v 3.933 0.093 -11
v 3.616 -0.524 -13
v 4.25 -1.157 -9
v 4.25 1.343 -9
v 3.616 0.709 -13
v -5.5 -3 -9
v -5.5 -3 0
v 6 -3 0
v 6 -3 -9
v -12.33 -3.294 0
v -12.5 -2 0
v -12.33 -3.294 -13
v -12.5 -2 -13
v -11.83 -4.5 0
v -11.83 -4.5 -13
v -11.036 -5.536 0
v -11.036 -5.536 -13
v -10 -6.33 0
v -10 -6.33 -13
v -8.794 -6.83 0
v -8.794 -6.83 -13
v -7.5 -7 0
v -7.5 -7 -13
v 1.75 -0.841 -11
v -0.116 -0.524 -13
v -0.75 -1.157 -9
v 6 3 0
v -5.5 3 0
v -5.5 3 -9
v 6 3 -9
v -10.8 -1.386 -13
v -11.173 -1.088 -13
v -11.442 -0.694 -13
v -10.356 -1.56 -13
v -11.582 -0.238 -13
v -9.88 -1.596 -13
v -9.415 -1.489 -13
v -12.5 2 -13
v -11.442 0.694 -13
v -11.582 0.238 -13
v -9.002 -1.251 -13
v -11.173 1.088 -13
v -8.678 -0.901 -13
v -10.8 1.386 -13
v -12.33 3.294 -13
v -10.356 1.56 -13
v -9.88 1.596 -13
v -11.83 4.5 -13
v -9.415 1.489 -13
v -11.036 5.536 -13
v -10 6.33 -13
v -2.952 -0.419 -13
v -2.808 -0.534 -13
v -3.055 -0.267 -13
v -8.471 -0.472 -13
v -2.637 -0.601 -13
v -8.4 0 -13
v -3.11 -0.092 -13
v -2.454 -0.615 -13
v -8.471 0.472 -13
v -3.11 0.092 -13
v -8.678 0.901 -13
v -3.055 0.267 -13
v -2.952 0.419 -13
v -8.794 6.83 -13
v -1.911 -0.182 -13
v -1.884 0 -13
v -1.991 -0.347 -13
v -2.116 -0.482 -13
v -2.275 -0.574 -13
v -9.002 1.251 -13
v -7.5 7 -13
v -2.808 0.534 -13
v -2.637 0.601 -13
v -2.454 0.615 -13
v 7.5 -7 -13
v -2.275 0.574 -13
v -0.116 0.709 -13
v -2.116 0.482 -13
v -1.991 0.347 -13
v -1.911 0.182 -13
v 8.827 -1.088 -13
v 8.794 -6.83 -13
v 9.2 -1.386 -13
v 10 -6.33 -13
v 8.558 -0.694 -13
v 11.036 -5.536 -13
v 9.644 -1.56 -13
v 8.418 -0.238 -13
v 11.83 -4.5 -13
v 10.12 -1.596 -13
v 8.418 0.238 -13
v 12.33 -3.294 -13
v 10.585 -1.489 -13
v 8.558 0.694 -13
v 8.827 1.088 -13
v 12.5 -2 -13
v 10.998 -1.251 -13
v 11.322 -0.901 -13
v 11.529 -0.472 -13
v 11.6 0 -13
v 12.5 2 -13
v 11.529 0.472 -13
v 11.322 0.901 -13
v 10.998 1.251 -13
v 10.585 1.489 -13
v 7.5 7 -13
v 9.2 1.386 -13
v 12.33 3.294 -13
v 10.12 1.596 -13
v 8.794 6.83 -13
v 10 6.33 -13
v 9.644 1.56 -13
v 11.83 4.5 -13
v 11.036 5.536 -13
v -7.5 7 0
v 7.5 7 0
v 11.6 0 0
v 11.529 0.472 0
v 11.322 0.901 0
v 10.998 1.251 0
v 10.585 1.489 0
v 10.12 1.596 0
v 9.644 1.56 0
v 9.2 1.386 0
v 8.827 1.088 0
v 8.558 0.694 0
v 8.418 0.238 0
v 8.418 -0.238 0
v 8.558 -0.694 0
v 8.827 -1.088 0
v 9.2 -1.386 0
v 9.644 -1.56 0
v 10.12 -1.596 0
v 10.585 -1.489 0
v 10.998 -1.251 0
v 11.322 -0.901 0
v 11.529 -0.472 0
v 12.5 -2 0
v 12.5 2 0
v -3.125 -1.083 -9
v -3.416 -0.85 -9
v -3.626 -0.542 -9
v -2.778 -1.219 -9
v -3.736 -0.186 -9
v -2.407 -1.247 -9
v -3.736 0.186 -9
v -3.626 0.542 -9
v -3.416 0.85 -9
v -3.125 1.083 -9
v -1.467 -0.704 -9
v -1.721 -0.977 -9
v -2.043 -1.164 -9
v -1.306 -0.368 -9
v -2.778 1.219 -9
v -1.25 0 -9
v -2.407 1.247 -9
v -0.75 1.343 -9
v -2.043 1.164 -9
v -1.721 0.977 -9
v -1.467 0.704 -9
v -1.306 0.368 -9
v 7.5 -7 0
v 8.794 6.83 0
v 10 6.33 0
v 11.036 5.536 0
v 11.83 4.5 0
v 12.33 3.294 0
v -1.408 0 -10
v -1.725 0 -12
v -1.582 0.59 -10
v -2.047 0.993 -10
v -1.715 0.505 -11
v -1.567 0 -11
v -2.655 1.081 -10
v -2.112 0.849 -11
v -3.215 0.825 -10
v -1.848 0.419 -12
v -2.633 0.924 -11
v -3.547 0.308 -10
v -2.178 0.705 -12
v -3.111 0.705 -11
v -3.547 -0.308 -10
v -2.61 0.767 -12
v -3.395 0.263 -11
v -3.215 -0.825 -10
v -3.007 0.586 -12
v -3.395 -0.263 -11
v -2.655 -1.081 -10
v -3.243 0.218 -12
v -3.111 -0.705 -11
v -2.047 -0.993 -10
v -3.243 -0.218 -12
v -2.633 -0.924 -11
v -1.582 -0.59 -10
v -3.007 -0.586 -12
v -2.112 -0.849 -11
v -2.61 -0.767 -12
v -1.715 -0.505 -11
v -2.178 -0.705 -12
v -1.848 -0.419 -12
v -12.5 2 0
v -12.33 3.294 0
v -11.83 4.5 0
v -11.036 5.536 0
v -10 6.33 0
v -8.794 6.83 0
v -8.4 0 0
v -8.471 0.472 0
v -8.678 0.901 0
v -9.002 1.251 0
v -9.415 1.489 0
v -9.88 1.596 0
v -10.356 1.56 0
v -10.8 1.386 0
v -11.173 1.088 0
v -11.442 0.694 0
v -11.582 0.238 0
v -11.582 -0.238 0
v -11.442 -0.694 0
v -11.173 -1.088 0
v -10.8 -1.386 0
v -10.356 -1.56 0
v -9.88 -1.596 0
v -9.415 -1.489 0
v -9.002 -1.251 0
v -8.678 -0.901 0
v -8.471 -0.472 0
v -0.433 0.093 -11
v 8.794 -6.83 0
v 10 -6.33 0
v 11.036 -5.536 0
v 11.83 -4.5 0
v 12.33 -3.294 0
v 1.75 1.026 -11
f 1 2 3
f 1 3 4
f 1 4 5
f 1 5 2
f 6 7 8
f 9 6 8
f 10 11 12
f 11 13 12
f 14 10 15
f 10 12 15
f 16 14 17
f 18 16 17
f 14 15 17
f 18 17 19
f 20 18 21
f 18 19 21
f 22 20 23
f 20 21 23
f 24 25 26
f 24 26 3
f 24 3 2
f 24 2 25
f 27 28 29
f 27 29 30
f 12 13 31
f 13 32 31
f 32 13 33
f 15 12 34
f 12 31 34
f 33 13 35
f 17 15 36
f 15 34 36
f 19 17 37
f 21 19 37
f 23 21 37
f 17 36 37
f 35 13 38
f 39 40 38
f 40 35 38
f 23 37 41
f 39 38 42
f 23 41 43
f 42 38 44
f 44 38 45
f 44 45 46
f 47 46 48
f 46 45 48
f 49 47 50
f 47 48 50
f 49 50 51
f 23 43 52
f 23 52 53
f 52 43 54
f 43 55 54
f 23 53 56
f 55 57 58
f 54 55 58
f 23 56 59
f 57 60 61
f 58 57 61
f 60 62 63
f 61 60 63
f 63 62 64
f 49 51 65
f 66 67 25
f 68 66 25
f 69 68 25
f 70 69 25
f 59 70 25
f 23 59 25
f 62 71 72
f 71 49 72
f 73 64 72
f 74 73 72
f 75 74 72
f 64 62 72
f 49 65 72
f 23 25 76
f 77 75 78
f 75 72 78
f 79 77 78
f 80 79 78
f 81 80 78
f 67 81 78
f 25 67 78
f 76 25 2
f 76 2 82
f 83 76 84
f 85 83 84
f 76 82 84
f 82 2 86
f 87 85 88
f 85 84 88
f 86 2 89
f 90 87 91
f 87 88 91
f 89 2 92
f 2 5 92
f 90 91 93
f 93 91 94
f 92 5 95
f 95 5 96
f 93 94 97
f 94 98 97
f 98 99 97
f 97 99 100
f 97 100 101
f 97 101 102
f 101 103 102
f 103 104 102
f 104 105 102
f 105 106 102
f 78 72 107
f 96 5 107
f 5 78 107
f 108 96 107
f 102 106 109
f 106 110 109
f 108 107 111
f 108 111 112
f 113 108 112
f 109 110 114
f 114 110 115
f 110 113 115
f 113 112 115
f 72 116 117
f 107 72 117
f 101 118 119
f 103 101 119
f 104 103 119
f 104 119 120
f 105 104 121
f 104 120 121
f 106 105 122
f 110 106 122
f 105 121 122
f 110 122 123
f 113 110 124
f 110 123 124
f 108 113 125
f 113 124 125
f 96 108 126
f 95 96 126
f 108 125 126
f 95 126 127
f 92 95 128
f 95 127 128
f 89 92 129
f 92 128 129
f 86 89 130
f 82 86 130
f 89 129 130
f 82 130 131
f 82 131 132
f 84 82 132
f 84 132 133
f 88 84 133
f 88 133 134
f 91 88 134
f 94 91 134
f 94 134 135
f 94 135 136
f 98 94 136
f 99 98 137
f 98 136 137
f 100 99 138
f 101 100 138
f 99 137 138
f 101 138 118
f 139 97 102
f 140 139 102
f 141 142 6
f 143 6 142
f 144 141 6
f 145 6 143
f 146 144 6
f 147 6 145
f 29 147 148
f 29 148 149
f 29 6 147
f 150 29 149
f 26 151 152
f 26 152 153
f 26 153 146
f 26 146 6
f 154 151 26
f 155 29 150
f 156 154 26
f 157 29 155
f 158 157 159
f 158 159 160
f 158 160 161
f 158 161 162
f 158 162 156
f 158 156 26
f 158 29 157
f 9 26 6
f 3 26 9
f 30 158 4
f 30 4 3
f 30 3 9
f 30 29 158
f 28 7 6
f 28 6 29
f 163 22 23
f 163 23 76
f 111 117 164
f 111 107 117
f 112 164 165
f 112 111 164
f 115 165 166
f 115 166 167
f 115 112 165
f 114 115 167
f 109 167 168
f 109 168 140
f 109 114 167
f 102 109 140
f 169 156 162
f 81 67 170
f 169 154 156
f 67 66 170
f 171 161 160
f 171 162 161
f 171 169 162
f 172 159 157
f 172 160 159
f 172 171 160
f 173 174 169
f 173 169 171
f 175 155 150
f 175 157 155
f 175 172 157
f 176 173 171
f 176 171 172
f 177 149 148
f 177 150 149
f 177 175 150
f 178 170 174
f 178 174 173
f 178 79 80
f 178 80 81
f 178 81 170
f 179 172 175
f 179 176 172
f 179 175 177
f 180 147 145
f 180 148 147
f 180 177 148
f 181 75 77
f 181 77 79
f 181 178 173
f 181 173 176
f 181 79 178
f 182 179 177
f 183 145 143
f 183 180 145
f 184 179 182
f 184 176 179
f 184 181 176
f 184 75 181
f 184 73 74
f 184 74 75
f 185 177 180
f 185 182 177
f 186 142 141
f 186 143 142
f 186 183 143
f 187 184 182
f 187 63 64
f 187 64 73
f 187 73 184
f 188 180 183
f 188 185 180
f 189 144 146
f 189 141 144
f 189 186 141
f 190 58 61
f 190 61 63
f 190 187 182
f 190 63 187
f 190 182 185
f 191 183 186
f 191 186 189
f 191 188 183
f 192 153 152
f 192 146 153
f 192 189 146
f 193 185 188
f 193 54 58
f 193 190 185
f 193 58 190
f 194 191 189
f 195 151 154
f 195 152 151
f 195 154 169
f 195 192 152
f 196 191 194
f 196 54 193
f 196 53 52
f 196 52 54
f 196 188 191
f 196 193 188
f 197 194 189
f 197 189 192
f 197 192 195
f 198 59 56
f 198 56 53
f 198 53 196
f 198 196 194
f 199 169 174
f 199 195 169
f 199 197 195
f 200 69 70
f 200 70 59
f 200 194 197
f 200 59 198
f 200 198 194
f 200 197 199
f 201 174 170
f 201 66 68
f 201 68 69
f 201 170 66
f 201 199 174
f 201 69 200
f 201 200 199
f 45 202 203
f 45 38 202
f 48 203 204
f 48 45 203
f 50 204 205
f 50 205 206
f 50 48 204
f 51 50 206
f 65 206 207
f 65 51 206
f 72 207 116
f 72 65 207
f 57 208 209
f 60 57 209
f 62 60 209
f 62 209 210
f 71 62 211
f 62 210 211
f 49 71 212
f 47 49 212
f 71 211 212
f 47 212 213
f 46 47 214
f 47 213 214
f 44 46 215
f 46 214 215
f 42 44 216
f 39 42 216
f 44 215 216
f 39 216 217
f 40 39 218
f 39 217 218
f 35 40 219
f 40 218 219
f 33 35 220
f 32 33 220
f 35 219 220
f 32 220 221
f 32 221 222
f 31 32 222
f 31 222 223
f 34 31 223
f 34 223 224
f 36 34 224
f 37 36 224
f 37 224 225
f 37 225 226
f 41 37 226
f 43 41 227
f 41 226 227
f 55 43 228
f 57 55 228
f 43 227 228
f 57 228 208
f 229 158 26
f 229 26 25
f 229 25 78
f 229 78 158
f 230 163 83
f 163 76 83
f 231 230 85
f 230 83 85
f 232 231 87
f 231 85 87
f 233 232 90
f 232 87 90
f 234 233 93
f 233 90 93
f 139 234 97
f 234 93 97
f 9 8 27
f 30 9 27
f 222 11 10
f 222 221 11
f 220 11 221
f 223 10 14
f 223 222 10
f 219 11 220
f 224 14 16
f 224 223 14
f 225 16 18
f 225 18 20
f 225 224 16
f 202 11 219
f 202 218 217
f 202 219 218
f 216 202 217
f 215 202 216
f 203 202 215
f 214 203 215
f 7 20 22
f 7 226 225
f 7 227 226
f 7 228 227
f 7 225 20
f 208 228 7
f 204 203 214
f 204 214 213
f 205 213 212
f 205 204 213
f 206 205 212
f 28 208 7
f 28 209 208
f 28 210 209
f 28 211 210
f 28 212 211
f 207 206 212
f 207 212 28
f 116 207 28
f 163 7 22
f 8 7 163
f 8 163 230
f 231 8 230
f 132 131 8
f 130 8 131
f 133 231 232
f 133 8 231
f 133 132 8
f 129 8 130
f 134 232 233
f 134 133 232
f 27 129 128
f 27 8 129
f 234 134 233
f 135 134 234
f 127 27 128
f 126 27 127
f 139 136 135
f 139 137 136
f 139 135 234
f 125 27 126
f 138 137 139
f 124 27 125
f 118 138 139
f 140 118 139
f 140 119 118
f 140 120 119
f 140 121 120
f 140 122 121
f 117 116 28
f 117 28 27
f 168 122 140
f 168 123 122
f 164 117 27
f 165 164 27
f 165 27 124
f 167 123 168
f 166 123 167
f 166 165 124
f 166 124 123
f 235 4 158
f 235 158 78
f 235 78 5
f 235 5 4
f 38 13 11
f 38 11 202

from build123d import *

# Parameters (mm, degrees)
F0_W     = 25
F0_H     = 14
F0_R     = 1.6
F0_W_2   = 11.5
F0_H_2   = 6
F0_R_2   = 1.25
F0_W_3   = 5
F0_H_3   = 2.5
F1_DEPTH = 13
F2_DEPTH = 9
F3_W     = 5
F3_H     = 2.5
F3_R     = 1.25
F4_DEPTH = 5
F4_TAPER = 9
F5_R     = 5


with BuildPart() as f1:
    # F0 (on Top) → F1 (new body)
    with BuildSketch(Plane.XY):
        Rectangle(F0_W, F0_H)
        with Locations((-10, 0)):
            Circle(F0_R, mode=Mode.SUBTRACT)
        with Locations((0.25, 0)):
            Rectangle(F0_W_2, F0_H_2, mode=Mode.SUBTRACT)
        with Locations((10, 0)):
            Circle(F0_R, mode=Mode.SUBTRACT)
        with Locations((0.25, 0)):
            Rectangle(F0_W_2, F0_H_2)
        with Locations((-2.5, 0)):
            Circle(F0_R_2, mode=Mode.SUBTRACT)
        with Locations((1.75, 0.0926498271)):
            Rectangle(F0_W_3, F0_H_3, mode=Mode.SUBTRACT)
        with Locations((-2.5, 0)):
            Circle(F0_R_2)
        with Locations((1.75, 0.0926498271)):
            Rectangle(F0_W_3, F0_H_3)
    extrude(amount=-F1_DEPTH)

    # F0 (on Top) → F2 (cut)
    with BuildSketch(Plane.XY):
        with Locations((0.25, 0)):
            Rectangle(F0_W_2, F0_H_2)
        with Locations((-2.5, 0)):
            Circle(F0_R_2, mode=Mode.SUBTRACT)
        with Locations((1.75, 0.0926498271)):
            Rectangle(F0_W_3, F0_H_3, mode=Mode.SUBTRACT)
        with Locations((-2.5, 0)):
            Circle(F0_R_2)
        with Locations((1.75, 0.0926498271)):
            Rectangle(F0_W_3, F0_H_3)
    extrude(amount=-F2_DEPTH, mode=Mode.SUBTRACT)

    # F3 (on face) → F4 (cut)
    with BuildSketch(Plane.XY.offset(-9)):
        with Locations((1.75, 0.0926498271)):
            Rectangle(F3_W, F3_H)
        with Locations((-2.5, 0)):
            Circle(F3_R)
    extrude(amount=-F4_DEPTH, taper=F4_TAPER, mode=Mode.SUBTRACT)

    # F5
    f5_edges = [f1.edges().sort_by_distance(p)[0] for p in [
        (-12.5, 7, -6.5),
        (12.5, -7, -6.5),
        (12.5, 7, -6.5),
        (-12.5, -7, -6.5),
    ]]
    fillet(f5_edges, radius=F5_R)


solid = f1.part
